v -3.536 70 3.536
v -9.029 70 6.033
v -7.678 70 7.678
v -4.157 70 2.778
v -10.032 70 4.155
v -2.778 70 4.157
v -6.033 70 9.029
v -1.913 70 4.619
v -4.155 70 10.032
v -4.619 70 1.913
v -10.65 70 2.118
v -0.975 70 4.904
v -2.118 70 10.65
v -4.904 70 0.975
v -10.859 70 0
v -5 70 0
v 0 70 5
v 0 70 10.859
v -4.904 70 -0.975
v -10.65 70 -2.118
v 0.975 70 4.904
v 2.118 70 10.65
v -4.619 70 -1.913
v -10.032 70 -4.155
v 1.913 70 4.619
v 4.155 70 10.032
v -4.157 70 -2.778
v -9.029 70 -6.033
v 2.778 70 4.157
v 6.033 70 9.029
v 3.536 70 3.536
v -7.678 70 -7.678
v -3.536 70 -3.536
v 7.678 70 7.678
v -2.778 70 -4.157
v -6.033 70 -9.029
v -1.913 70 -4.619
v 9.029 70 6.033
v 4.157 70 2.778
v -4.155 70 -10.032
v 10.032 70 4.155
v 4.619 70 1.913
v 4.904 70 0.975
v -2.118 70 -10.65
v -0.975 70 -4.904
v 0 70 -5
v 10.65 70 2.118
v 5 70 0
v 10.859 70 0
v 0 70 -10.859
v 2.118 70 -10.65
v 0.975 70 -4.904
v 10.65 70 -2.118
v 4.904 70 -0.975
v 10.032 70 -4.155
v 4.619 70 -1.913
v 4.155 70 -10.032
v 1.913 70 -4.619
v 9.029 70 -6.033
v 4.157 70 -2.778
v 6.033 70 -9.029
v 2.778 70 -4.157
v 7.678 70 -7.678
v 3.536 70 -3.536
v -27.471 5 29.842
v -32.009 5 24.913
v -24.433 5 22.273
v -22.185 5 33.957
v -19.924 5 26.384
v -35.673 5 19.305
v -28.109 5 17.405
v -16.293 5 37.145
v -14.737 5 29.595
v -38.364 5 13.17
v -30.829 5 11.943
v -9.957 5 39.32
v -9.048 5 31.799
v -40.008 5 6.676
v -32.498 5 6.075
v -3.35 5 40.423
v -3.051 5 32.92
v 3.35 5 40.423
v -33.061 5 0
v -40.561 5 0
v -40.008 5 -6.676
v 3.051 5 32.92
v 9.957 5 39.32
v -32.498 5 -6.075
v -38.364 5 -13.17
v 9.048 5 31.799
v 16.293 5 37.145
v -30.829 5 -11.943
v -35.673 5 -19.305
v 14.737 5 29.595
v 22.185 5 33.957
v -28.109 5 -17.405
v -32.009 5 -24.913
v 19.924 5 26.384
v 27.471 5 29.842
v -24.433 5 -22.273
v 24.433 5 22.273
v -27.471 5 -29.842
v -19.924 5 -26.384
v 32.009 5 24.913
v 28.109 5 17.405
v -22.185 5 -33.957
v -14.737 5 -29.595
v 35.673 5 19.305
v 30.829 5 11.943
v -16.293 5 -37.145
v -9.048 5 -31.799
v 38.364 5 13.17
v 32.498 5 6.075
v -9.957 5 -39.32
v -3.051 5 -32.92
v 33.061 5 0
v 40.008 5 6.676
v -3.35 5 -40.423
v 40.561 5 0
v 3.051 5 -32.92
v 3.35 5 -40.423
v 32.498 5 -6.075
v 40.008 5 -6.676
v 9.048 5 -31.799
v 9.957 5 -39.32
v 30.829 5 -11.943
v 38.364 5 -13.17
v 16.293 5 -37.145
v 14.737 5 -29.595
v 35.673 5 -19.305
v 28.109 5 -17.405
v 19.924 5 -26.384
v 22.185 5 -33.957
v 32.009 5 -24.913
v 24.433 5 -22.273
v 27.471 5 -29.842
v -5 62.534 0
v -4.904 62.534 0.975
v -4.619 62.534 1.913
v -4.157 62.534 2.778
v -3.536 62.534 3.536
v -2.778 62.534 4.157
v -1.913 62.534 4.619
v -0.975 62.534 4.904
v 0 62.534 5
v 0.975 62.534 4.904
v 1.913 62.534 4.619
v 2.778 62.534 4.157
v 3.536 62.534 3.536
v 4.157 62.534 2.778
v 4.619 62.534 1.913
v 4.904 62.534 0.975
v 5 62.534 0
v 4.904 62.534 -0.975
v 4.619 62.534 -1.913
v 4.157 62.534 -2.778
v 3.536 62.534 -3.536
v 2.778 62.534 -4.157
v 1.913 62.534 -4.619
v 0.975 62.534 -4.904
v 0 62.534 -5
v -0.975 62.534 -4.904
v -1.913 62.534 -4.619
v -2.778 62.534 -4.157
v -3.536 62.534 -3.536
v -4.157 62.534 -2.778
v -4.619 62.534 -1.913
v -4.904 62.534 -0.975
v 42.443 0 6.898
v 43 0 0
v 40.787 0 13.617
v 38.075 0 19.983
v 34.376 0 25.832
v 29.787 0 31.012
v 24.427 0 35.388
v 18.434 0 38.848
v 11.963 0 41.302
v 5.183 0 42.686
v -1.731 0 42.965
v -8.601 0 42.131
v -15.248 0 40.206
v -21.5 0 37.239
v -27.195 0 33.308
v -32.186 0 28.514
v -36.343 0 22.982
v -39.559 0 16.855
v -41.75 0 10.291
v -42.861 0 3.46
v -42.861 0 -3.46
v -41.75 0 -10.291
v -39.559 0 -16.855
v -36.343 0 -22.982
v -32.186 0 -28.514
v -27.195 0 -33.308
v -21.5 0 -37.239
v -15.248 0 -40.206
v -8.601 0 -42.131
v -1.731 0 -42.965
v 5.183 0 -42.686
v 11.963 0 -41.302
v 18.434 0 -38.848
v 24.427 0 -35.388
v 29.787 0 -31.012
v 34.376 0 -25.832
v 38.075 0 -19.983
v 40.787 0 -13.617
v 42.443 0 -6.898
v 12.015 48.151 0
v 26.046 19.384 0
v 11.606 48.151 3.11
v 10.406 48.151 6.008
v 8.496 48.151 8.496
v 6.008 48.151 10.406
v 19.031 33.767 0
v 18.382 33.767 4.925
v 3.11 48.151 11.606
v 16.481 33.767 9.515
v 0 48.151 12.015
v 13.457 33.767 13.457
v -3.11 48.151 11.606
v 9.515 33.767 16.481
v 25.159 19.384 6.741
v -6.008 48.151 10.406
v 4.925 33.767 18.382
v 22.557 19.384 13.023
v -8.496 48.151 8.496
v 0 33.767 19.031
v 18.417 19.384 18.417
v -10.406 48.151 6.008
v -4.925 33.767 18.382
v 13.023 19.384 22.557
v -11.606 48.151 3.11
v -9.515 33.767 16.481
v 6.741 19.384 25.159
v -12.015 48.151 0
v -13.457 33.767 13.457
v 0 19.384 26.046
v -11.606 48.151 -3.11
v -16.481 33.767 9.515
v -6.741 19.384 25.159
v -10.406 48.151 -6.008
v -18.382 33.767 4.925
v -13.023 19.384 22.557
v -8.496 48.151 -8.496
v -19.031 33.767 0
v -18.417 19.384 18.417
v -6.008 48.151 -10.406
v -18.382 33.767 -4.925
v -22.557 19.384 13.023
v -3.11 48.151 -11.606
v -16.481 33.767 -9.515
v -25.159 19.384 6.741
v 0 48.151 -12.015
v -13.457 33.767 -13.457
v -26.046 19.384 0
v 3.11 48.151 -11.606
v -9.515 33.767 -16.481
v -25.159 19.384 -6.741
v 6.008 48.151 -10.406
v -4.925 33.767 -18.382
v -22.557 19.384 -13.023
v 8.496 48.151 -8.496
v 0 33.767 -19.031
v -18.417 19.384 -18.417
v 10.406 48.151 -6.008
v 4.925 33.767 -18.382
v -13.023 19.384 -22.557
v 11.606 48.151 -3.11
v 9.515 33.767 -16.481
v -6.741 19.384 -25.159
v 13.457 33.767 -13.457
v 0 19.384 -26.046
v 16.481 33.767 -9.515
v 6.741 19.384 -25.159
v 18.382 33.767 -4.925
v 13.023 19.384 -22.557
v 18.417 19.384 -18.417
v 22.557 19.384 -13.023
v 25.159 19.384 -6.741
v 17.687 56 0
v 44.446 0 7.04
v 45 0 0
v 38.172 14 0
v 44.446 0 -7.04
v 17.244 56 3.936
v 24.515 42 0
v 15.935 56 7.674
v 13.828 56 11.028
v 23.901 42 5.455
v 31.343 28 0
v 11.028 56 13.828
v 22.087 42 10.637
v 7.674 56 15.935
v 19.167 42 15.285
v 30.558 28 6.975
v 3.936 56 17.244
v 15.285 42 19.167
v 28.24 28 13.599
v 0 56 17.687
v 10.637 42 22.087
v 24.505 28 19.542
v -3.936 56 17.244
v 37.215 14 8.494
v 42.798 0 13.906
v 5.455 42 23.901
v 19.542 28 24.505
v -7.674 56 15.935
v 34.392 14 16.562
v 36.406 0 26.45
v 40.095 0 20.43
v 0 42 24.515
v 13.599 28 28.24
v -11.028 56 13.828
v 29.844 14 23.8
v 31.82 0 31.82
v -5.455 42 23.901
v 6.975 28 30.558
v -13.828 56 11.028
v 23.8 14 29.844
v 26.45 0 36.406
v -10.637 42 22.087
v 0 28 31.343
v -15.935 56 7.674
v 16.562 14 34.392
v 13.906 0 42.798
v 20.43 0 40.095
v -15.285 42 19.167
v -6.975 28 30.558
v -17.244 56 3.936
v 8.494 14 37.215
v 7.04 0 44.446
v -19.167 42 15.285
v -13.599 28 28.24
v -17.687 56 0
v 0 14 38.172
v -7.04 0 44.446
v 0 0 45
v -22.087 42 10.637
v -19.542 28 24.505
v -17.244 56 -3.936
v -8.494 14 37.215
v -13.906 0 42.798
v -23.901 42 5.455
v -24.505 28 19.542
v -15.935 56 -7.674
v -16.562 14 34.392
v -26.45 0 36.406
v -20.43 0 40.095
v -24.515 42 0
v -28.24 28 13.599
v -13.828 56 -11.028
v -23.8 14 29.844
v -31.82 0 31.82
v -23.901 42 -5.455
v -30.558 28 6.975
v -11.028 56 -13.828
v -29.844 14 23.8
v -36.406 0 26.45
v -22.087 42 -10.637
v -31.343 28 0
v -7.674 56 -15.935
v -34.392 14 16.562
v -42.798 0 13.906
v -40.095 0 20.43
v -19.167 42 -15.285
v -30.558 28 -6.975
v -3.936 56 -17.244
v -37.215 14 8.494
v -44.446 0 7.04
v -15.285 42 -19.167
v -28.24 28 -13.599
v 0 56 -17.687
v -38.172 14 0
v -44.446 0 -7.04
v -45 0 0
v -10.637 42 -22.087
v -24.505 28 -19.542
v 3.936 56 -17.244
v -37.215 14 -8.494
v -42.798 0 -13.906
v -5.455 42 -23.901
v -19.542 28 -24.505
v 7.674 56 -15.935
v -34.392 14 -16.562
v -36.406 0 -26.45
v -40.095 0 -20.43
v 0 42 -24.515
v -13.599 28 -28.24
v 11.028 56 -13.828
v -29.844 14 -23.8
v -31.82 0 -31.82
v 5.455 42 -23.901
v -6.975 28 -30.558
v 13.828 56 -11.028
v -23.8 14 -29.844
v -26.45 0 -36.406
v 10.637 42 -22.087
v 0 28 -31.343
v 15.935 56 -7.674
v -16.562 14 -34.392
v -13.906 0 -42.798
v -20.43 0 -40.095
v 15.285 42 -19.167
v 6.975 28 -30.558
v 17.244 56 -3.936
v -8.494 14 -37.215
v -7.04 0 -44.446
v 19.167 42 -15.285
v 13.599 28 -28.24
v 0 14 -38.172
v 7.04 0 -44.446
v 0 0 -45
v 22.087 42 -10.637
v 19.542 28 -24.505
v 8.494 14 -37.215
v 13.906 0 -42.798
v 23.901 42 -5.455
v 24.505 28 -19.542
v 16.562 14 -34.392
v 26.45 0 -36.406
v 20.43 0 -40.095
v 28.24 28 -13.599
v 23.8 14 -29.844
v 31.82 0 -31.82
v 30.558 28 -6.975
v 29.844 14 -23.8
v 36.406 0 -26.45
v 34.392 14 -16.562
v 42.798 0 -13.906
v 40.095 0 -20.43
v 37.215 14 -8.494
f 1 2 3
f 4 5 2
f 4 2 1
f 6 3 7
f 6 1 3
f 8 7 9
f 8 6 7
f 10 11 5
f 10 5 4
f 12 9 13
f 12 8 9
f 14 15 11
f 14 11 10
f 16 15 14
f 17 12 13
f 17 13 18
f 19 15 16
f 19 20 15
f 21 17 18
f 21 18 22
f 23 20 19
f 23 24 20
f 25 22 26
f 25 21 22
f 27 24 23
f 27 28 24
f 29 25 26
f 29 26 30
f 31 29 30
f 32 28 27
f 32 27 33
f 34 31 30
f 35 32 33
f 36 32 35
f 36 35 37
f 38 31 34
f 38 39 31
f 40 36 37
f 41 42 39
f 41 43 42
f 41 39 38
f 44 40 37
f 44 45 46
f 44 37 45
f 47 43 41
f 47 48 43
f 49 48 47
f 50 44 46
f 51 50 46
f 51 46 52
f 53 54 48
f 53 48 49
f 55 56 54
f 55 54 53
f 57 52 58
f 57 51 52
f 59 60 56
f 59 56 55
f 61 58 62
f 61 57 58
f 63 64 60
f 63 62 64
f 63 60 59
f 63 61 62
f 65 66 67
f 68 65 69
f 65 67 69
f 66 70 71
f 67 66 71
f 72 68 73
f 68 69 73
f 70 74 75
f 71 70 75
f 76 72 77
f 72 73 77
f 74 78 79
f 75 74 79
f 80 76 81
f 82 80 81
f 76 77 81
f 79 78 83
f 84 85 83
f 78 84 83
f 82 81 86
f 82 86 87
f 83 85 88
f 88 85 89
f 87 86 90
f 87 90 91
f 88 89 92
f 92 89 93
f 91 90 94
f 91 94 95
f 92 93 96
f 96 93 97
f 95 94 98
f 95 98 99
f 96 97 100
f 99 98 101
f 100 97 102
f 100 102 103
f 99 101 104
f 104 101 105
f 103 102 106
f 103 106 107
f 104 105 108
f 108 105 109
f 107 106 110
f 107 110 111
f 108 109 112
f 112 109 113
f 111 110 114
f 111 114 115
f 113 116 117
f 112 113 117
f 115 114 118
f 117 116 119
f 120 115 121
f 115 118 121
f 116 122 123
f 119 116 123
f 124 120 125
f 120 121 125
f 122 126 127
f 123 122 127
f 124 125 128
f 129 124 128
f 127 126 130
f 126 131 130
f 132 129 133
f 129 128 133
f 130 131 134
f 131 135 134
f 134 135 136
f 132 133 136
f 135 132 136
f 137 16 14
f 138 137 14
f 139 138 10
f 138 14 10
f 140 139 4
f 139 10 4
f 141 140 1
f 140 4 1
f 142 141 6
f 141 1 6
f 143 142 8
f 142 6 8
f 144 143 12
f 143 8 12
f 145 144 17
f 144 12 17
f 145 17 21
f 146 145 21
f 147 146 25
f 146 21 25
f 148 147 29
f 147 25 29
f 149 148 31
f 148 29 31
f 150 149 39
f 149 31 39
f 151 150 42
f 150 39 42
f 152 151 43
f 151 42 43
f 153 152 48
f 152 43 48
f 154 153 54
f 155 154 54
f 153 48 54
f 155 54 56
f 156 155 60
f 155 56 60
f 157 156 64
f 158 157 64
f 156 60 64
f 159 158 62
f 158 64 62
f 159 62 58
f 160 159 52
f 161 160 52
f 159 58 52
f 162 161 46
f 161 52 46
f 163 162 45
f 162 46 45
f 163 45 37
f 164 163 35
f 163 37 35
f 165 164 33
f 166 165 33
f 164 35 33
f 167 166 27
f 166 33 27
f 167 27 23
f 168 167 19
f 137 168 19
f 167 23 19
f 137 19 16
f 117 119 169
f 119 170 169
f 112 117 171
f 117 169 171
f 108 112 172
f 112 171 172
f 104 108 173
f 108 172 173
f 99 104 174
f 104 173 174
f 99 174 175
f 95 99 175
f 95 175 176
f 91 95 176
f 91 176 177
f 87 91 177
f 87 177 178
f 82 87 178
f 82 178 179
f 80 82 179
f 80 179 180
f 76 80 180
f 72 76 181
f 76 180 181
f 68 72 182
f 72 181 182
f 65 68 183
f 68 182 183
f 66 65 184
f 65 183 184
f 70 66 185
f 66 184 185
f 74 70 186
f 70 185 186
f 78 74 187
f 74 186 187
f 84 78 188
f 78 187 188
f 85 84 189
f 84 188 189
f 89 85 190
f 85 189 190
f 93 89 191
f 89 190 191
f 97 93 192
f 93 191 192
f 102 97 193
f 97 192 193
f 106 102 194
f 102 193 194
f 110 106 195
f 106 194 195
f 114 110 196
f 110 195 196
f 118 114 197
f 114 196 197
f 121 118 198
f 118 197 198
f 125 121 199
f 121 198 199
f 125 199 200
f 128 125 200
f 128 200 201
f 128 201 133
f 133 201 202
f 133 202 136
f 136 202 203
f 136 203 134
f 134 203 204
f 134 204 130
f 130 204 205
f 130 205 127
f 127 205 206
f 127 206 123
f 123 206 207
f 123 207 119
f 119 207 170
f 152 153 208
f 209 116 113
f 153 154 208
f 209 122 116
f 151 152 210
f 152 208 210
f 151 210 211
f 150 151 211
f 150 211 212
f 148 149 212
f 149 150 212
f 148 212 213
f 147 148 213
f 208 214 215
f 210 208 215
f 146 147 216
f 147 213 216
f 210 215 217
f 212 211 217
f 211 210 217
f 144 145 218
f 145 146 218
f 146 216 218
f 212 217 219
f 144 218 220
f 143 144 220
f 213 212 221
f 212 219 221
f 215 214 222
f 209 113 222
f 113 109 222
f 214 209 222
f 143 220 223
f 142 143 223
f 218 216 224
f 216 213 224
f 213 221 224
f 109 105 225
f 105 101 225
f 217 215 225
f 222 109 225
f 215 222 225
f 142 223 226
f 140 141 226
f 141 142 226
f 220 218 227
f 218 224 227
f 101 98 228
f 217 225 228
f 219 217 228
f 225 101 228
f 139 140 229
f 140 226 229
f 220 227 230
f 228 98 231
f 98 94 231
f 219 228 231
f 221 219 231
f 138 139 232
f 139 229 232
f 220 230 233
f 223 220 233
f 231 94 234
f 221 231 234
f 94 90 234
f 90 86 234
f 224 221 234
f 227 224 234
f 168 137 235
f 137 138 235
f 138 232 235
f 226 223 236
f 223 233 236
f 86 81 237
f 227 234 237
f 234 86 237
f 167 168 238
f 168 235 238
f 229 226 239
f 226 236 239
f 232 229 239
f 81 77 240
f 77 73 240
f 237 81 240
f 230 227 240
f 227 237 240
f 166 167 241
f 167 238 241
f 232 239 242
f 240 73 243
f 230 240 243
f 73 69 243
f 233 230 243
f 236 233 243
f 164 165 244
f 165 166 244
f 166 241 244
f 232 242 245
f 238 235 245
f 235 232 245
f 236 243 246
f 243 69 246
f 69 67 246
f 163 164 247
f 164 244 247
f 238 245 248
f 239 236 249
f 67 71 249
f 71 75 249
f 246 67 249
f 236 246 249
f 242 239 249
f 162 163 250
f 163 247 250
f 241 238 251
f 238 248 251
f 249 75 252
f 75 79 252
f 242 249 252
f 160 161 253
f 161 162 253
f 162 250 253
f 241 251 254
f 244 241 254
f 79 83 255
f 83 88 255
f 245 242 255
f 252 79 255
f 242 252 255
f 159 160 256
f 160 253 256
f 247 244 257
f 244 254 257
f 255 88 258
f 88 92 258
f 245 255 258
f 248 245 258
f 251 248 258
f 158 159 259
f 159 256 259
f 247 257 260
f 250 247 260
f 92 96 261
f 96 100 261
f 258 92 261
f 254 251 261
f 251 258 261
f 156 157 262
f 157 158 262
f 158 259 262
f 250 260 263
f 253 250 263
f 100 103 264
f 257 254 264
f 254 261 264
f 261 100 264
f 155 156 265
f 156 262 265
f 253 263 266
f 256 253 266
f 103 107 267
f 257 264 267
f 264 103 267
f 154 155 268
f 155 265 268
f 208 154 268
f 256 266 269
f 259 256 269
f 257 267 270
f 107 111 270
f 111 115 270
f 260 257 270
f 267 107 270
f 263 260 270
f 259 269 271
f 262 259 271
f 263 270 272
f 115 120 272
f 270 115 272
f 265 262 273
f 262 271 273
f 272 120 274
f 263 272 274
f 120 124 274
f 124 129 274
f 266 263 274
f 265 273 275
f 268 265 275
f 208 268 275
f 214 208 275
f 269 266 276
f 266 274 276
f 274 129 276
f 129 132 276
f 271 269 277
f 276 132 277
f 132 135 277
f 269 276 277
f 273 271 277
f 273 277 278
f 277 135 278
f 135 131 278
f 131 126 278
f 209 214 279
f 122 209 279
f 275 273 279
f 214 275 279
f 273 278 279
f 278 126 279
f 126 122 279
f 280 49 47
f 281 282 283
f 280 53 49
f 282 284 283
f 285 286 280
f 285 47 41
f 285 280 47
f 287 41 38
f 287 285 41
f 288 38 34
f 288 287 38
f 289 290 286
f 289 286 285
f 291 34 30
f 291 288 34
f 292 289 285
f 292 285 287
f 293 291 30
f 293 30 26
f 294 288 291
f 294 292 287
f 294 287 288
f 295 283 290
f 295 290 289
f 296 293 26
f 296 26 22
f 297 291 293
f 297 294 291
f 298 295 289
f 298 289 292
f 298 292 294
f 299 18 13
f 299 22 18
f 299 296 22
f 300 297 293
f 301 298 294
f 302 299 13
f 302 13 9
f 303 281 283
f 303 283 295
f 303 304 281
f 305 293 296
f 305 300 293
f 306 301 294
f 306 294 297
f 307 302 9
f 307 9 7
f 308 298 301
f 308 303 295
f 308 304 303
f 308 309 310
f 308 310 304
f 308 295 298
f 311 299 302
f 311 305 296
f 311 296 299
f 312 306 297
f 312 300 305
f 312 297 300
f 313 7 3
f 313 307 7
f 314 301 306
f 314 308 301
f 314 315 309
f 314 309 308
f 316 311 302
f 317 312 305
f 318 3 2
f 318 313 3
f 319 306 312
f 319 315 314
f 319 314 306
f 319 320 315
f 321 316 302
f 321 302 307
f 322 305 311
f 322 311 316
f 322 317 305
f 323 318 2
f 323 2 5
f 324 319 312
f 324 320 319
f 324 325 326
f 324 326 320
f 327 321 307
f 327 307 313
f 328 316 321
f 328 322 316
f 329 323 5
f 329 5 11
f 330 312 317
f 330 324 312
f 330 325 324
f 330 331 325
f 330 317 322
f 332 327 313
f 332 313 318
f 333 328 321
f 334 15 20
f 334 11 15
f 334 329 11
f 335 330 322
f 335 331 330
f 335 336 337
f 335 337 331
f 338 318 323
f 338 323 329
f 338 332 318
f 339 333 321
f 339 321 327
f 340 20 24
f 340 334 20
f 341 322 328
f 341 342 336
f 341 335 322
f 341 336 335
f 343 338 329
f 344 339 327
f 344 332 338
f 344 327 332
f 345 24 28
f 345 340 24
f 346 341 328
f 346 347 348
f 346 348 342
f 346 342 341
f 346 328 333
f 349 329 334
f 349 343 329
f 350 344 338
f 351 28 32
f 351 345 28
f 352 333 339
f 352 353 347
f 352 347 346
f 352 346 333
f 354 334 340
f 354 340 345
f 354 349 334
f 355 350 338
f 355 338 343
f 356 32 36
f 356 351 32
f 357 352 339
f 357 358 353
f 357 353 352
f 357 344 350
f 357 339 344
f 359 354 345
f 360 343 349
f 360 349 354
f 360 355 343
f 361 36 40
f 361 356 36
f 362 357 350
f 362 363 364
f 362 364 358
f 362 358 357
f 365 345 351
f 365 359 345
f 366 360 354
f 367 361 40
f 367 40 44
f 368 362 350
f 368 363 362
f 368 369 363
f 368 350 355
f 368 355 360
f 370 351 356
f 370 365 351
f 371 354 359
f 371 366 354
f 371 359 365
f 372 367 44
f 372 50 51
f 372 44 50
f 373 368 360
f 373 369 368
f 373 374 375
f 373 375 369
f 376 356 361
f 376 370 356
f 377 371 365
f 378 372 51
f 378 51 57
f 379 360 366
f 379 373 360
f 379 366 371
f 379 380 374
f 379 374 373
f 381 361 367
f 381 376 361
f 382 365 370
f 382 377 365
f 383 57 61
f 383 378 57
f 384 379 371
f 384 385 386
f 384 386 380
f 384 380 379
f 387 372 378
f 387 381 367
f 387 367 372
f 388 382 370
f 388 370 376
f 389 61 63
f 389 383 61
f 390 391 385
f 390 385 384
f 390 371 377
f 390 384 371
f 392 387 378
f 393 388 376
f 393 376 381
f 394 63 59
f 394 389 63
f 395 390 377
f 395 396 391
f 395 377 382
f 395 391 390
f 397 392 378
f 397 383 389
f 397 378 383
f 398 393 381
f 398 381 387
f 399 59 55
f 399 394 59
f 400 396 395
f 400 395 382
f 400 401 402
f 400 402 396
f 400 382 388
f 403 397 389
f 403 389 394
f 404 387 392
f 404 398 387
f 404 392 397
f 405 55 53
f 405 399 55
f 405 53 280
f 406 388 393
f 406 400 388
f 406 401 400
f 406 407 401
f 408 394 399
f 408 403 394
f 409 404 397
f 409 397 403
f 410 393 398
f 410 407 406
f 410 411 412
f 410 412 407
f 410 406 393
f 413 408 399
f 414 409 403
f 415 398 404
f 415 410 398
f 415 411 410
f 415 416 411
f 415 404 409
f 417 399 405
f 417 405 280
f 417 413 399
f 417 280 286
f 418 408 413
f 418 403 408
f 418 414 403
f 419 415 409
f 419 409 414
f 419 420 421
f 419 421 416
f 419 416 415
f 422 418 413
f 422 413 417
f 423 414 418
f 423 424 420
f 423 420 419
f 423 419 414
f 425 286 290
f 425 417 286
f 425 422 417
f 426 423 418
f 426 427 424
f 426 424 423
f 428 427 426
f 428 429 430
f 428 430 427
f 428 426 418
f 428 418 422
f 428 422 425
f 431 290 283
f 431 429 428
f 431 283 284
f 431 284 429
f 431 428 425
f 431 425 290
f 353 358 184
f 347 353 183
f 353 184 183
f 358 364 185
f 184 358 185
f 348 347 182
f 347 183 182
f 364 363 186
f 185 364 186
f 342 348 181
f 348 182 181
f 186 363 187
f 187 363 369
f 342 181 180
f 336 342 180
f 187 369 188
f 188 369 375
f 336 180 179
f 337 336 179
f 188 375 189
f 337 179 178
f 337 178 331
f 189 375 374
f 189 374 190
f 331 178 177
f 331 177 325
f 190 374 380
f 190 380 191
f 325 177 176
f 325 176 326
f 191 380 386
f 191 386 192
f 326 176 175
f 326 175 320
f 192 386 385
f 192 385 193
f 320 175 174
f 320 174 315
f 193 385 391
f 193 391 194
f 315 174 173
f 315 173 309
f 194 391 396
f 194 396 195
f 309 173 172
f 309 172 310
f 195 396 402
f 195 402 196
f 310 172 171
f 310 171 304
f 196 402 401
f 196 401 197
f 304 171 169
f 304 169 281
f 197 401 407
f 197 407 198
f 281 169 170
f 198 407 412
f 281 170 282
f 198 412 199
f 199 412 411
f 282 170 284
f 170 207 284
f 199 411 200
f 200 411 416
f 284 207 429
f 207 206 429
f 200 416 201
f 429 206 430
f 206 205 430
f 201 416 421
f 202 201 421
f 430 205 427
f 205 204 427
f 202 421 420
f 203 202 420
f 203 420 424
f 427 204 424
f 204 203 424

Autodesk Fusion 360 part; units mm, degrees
sketch "Esquisse1" plane through (0, 0, 0) normal (0, 1, 0) x (1, 0, 0)
  circle A0 centre (0, 0) radius 45
  dimension "d1" = 90
sketch "Esquisse2" plane through (0, 0, 0) normal (0, 1, 0) x (1, 0, 0)
  circle A0 centre (0, 0) radius 43
  dimension "d2" = 86
sketch "Esquisse3" plane through (0, 0, 0) normal (0, 1, 0) x (1, 0, 0)
  circle A0 centre (0, 0) radius 35.5
  dimension "d3" = 71
extrude "Extrusion1" add sketch "Esquisse1" along normal blind 70 draft -26
sketch "Esquisse4" plane through (0, 70, 0) normal (0, 1, 0) x (-1, 0, 0)
  circle A0 centre (0, 0) radius 10.8587
  circle A1 centre (0, 0) radius 5
  dimension "d6" = 10
extrude "Extrusion2" cut sketch "Esquisse2" along normal blind 5 draft -26
extrude "Extrusion3" cut sketch "Esquisse4" against normal blind 15 contours A1
extrude "Extrusion4" cut sketch "Esquisse3" along normal blind 70 draft -26
sketch "Esquisse5" plane through (0, 0, 0) normal (0, 0, 1) x (1, 0, 0)
